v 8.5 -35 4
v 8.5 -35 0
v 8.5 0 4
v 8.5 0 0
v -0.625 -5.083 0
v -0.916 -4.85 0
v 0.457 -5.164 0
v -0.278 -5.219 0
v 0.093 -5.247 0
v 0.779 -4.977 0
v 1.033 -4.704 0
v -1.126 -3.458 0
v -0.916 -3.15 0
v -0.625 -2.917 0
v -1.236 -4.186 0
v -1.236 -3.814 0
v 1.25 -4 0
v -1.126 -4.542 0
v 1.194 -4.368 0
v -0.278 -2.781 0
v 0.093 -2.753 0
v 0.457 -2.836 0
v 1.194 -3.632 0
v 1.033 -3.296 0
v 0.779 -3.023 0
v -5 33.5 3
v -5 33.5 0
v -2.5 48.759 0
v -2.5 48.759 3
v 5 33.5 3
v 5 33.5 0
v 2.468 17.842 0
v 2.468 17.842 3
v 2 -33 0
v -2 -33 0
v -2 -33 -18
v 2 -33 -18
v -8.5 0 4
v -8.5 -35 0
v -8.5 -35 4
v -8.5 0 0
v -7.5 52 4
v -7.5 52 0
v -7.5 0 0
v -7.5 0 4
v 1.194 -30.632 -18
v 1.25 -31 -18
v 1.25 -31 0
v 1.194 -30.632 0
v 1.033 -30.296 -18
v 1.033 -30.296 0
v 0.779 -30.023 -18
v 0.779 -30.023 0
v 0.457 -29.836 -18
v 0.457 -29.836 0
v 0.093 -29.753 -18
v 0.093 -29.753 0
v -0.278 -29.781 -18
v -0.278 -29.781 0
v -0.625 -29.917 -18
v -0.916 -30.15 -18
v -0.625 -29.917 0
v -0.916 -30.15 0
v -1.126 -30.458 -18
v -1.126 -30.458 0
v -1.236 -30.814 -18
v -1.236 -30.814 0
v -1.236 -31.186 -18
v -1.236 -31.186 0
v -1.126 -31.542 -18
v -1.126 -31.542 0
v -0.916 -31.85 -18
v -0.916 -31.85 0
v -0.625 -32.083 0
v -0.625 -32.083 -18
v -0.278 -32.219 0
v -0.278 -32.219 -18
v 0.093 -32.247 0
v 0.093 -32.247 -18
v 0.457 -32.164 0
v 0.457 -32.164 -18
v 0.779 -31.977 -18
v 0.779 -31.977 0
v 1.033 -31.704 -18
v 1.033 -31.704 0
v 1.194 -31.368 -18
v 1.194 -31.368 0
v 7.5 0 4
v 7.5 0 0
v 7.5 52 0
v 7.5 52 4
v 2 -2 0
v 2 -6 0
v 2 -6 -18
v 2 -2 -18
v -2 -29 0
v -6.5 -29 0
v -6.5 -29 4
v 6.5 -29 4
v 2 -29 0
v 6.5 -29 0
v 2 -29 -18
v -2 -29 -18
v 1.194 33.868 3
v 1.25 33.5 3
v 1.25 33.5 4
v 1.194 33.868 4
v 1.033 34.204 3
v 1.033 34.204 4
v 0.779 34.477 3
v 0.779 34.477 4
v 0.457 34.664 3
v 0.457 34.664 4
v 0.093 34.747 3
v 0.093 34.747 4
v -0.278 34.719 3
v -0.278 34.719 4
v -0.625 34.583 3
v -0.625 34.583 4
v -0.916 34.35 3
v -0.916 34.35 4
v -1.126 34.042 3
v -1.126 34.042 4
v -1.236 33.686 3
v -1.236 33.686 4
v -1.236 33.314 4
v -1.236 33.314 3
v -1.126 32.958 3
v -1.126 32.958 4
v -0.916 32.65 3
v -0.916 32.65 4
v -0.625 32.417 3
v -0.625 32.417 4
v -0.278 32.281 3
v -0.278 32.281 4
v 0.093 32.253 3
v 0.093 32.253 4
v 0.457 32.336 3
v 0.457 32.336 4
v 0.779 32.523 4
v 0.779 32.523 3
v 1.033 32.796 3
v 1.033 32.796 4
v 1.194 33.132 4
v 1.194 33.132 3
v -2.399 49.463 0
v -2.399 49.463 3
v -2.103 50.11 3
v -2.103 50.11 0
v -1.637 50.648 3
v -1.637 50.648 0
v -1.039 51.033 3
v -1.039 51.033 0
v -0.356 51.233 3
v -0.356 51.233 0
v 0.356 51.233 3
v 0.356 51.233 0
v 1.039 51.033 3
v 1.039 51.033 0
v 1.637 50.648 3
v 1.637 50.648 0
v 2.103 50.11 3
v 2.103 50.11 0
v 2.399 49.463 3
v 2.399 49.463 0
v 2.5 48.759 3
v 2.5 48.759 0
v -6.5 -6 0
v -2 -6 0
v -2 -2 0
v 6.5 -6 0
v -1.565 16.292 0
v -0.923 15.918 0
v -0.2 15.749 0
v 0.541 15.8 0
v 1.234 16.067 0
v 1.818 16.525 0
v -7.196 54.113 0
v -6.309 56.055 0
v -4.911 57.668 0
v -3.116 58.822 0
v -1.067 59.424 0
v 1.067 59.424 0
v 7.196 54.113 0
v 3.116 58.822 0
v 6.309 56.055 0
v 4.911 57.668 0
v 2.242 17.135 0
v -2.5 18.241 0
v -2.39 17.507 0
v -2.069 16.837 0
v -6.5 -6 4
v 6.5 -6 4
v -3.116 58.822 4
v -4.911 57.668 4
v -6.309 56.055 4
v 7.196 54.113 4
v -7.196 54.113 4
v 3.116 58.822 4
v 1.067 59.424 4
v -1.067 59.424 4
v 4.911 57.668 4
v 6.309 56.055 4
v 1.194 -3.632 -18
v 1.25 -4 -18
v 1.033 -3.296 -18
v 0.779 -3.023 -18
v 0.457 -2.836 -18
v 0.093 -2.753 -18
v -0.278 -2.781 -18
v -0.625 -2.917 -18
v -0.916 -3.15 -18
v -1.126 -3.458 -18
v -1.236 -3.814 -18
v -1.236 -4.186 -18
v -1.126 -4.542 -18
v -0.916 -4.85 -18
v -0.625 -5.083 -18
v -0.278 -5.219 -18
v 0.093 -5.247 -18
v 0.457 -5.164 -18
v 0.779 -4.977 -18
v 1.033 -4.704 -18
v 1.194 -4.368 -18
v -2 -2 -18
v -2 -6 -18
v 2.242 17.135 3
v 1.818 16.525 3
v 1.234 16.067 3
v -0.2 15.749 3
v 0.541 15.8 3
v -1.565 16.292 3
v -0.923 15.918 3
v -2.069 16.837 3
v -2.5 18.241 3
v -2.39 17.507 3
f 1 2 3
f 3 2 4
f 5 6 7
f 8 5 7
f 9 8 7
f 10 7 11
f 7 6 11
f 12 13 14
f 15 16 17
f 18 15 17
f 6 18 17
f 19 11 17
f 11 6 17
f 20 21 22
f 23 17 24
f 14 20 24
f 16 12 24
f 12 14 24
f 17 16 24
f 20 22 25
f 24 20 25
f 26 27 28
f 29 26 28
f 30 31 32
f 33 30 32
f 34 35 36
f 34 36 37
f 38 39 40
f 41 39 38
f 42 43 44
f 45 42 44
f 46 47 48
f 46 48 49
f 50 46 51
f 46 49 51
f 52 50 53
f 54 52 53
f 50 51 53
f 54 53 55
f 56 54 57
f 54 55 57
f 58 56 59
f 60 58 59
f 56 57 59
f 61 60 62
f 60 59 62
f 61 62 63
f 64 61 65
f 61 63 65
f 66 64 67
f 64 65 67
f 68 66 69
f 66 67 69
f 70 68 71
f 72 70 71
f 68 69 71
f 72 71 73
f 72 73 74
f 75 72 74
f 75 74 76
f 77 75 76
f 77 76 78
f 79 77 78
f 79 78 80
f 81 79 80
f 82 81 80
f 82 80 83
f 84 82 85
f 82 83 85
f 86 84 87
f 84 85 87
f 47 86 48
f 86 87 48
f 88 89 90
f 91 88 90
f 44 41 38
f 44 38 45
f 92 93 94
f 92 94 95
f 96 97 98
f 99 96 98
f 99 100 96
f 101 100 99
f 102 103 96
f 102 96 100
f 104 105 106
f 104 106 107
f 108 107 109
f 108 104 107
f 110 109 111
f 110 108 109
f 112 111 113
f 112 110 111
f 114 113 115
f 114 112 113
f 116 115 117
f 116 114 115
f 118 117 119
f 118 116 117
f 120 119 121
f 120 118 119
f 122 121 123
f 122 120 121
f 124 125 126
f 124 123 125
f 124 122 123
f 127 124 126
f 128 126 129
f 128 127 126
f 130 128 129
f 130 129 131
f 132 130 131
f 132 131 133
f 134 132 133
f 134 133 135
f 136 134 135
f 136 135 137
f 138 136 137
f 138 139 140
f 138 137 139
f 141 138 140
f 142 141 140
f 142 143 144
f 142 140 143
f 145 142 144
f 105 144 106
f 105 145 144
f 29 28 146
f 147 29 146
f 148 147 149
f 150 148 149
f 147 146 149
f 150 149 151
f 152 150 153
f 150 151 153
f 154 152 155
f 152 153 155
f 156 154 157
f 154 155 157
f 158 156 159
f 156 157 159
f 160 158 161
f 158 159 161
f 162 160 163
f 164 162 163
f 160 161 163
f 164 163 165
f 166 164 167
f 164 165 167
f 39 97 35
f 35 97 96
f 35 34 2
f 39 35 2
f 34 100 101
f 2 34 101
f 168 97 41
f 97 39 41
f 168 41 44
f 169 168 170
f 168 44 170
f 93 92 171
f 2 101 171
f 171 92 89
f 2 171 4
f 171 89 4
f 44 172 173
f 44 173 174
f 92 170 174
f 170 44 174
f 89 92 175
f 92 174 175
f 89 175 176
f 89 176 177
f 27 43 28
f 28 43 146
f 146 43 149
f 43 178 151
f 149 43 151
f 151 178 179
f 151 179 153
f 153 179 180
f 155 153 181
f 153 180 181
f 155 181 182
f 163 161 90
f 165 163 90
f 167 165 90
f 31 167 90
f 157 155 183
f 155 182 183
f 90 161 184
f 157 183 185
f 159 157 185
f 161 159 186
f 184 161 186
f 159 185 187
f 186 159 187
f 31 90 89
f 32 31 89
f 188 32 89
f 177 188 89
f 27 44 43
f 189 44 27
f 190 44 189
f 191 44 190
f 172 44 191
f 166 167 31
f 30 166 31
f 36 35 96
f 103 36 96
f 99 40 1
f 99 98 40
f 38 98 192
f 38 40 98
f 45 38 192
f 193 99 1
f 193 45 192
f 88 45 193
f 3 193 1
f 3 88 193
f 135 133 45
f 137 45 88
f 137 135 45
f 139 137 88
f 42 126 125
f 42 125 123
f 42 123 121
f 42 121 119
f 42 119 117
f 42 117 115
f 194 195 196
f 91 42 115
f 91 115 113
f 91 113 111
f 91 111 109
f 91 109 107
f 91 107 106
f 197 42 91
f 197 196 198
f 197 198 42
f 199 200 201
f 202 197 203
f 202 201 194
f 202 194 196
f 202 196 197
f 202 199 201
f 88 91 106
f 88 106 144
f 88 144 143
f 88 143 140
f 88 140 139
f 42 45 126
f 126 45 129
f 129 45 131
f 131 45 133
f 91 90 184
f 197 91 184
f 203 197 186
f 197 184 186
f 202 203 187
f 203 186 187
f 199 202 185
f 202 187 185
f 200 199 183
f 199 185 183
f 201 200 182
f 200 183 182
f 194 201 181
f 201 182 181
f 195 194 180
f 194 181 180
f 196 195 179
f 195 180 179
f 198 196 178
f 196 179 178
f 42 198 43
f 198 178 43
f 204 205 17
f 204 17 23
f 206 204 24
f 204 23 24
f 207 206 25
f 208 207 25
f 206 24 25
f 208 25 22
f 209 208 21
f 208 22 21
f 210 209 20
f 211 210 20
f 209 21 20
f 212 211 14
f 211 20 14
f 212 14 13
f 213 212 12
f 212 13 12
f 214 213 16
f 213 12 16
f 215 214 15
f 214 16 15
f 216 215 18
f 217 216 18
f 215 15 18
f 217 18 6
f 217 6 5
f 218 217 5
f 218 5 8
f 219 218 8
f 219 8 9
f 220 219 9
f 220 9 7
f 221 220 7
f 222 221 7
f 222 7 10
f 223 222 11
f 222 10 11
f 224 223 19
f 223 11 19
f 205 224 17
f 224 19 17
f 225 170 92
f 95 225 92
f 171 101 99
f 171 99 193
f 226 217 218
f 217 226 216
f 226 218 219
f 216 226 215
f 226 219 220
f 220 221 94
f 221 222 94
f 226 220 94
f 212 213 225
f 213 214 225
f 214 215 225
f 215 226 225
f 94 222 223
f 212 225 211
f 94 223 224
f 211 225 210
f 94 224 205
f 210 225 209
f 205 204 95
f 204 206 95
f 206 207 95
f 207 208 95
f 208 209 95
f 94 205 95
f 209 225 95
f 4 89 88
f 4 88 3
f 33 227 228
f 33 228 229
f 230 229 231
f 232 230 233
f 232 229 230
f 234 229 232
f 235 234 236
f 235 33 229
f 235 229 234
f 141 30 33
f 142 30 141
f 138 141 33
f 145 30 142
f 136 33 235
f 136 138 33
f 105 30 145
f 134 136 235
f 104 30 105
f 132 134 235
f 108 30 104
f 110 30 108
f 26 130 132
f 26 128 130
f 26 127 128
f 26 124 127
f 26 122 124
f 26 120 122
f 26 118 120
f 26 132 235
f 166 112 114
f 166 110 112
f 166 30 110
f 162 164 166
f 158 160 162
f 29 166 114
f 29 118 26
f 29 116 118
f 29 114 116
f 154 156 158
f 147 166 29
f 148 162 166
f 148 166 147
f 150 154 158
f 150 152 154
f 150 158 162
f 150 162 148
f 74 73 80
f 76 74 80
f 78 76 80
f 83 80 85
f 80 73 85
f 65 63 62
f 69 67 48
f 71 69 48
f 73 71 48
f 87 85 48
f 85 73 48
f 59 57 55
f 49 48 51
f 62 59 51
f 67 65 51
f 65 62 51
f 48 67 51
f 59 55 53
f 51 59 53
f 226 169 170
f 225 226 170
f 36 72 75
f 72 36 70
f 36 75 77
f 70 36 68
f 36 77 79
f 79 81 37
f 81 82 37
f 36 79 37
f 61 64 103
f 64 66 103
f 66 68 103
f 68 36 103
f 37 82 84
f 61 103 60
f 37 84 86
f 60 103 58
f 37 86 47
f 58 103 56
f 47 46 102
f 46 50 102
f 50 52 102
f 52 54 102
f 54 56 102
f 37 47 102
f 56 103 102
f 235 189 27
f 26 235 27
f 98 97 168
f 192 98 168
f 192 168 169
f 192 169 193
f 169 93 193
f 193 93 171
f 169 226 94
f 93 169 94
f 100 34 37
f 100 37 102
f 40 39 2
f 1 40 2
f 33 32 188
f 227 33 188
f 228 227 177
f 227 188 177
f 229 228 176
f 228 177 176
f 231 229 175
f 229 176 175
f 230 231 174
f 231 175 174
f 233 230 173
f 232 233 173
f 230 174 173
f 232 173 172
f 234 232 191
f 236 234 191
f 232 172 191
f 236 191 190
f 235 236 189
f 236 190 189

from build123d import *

# Parameters (mm, degrees)
EXTRUDE_1_DEPTH     = 4
CUT_EXTRUDE_1_DEPTH = 3
SKETCH_5_R          = 1.25
CUT_EXTRUDE_2_DEPTH = 12.4
SKETCH_6_W          = 17
SKETCH_6_H          = 35
EXTRUDE_2_DEPTH     = 4
SKETCH_7_W          = 13
SKETCH_7_H          = 23
CUT_EXTRUDE_3_DEPTH = 12.1
SKETCH_8_W          = 4
SKETCH_8_H          = 4
SKETCH_8_R          = 1.25
EXTRUDE_3_DEPTH     = 18


with BuildPart() as part:
    # 草圖1 → 填料-伸長1 (new body)
    with BuildSketch(Plane.XY):
        with BuildLine():
            Line((7.5, 0), (7.5, 52))
            ThreePointArc((7.5, 52), (0, 59.5), (-7.5, 52))
            Line((-7.5, 52), (-7.5, 0))
            Line((-7.5, 0), (7.5, 0))
        make_face()
    extrude(amount=EXTRUDE_1_DEPTH)

    # 草圖3 → 除料-伸長1 (cut)
    with BuildSketch(Plane.XY):
        with BuildLine():
            ThreePointArc((-2.5, 48.75876512), (0, 51.25876512), (2.5, 48.75876512))
            Line((2.5, 48.75876512), (5, 33.5))
            Line((5, 33.5), (2.467939071, 17.842139978))
            ThreePointArc((2.467939071, 17.842139978), (-0.200190311, 15.749263002), (-2.5, 18.24123488))
            Line((-2.5, 18.24123488), (-5, 33.5))
            Line((-5, 33.5), (-2.5, 48.75876512))
        make_face()
    extrude(amount=CUT_EXTRUDE_1_DEPTH, mode=Mode.SUBTRACT)

    # 草圖5 → 除料-伸長2 (cut)
    with BuildSketch(Plane.XY):
        with Locations((0, 33.5)):
            Circle(SKETCH_5_R)
    extrude(amount=CUT_EXTRUDE_2_DEPTH, mode=Mode.SUBTRACT)

    # 草圖6 → 填料-伸長2 (add)
    with BuildSketch(Plane.XY):
        with Locations((0, -17.5)):
            Rectangle(SKETCH_6_W, SKETCH_6_H)
    extrude(amount=EXTRUDE_2_DEPTH)

    # 草圖7 → 除料-伸長3 (cut)
    with BuildSketch(Plane.XY):
        with Locations((0, -17.5)):
            Rectangle(SKETCH_7_W, SKETCH_7_H)
    extrude(amount=CUT_EXTRUDE_3_DEPTH, mode=Mode.SUBTRACT)

    # 草圖8 → 填料-伸長3 (add)
    with BuildSketch(Plane.XY):
        with Locations((0, -4)):
            Rectangle(SKETCH_8_W, SKETCH_8_H)
        with Locations((0, -4)):
            Circle(SKETCH_8_R, mode=Mode.SUBTRACT)
        with Locations((0, -31)):
            Rectangle(SKETCH_8_W, SKETCH_8_H)
        with Locations((0, -31)):
            Circle(SKETCH_8_R, mode=Mode.SUBTRACT)
    extrude(amount=-EXTRUDE_3_DEPTH)


solid = part.part
